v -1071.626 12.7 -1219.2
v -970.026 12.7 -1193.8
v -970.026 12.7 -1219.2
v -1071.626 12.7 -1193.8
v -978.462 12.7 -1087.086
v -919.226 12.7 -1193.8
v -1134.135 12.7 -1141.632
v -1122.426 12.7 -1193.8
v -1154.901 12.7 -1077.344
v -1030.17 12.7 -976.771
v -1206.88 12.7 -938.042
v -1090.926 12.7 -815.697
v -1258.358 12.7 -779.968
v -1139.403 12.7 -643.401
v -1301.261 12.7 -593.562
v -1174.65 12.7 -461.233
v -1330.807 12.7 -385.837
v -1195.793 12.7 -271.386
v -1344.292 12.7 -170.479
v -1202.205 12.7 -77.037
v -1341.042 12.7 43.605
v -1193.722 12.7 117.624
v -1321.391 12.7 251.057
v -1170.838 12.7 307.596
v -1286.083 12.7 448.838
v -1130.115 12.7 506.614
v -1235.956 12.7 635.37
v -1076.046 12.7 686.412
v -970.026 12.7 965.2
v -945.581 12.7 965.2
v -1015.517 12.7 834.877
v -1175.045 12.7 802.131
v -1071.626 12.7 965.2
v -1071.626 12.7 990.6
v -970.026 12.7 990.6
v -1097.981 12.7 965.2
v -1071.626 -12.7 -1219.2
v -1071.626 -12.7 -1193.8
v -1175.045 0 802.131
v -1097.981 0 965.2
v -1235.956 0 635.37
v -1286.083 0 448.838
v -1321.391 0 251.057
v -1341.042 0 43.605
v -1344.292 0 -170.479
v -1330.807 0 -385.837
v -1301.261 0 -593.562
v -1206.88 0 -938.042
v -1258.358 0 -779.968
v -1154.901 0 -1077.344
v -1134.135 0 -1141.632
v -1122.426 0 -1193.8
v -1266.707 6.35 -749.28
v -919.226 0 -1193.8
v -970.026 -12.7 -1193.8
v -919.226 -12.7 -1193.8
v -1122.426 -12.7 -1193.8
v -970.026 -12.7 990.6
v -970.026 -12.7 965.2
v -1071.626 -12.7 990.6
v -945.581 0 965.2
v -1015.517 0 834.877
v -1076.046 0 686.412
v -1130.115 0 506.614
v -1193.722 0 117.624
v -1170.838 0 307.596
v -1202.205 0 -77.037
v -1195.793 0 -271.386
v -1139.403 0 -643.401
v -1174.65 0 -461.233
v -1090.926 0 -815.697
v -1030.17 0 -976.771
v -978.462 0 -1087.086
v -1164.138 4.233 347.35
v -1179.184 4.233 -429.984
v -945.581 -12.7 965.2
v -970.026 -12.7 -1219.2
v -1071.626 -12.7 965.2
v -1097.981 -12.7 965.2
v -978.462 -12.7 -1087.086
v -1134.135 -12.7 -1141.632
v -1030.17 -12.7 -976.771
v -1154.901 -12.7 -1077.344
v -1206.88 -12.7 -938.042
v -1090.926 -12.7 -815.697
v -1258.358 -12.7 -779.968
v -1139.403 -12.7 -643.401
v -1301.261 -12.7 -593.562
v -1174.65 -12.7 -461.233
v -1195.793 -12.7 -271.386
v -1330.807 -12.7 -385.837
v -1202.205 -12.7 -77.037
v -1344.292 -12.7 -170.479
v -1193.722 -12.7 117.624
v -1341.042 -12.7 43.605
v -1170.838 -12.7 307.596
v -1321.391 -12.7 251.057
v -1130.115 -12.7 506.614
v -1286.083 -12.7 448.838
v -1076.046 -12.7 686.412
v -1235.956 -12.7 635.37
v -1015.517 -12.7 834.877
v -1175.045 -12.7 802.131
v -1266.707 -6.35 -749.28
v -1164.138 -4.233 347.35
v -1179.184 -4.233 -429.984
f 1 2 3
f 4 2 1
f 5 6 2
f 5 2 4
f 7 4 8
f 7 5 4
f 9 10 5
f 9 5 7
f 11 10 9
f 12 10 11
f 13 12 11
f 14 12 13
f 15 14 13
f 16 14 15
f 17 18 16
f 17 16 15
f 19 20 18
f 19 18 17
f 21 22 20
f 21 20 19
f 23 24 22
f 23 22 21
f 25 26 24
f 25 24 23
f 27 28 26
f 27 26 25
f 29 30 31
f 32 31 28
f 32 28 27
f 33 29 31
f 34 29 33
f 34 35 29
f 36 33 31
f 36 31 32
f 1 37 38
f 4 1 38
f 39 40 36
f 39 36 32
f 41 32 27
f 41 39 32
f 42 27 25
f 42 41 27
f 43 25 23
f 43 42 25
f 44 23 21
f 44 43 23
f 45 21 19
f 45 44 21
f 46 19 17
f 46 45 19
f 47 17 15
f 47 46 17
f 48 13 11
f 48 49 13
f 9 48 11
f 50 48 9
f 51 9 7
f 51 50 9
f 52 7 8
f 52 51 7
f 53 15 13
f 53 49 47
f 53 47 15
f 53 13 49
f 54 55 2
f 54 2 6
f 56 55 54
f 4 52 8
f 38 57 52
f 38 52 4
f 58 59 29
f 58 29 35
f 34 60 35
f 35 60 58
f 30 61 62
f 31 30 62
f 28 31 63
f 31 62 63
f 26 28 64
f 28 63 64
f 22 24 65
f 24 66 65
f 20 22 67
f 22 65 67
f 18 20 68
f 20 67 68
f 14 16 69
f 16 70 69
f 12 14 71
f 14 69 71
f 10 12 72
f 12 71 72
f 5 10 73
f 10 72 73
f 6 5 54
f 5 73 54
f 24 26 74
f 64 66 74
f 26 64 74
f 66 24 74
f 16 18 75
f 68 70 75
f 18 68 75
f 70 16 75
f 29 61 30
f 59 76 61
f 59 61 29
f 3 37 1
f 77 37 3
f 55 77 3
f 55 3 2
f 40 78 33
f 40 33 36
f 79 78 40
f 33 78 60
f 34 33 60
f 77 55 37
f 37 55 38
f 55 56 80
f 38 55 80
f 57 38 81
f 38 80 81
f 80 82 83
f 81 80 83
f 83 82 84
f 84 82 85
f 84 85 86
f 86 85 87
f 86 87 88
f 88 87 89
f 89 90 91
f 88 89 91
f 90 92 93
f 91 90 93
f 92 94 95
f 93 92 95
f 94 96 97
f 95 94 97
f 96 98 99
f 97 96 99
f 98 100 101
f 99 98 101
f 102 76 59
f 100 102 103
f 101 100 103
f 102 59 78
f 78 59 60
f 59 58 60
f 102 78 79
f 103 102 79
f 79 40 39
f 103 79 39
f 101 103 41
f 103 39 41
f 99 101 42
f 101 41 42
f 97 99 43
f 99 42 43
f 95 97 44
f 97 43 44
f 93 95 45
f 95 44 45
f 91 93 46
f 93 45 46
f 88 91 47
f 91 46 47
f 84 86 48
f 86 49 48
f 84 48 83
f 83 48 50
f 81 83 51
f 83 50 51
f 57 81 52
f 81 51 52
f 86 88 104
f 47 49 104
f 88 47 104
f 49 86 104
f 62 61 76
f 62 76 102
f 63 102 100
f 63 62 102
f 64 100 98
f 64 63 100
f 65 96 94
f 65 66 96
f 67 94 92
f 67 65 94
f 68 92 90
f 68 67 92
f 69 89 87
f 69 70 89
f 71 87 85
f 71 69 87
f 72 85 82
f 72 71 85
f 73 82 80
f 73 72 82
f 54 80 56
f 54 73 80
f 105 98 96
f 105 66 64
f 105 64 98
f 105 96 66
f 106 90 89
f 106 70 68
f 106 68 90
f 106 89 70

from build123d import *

# Parameters (mm, degrees)
F1_DEPTH = 12.7
F2_W     = 101.6
F2_H     = 25.4
F3_DEPTH = 25.4


with BuildPart() as f1:
    # F0 (on Front) → F1 (new body, symmetric)
    with BuildSketch(Plane.XZ):
        with BuildLine():
            add(Edge.make_bspline(
                [(-945.5808670162, 965.2), (-1242.0630128025, 484.7582280636), (-1340.5170440674, -494.4096505642), (-919.226, -1193.8)],
                knots=[0, 0, 0, 0, 2159.1608506583, 2159.1608506583, 2159.1608506583, 2159.1608506583], degree=3))
            Line((-945.5808670162, 965.2), (-1097.9808670162, 965.2))
            add(Edge.make_bspline(
                [(-1097.9808670162, 965.2), (-1417.2196388245, 366.0375773907), (-1348.5663086676, -720.7227352137), (-1140.6033039093, -1081.5900564194), (-1122.426, -1193.8)],
                knots=[0, 0, 0, 0, 0.6575295809, 1, 1, 1, 1], degree=3))
            Line((-1122.426, -1193.8), (-919.226, -1193.8))
        make_face()
    extrude(amount=F1_DEPTH, both=True)

    # F2 (on face) → F3 (join, through all)
    with BuildSketch(Plane.XZ.offset(12.7)):
        with Locations((-1020.826, 977.9)):
            Rectangle(F2_W, F2_H)
        with Locations((-1020.826, -1206.5)):
            Rectangle(F2_W, F2_H)
    extrude(amount=-F3_DEPTH)


solid = f1.part
